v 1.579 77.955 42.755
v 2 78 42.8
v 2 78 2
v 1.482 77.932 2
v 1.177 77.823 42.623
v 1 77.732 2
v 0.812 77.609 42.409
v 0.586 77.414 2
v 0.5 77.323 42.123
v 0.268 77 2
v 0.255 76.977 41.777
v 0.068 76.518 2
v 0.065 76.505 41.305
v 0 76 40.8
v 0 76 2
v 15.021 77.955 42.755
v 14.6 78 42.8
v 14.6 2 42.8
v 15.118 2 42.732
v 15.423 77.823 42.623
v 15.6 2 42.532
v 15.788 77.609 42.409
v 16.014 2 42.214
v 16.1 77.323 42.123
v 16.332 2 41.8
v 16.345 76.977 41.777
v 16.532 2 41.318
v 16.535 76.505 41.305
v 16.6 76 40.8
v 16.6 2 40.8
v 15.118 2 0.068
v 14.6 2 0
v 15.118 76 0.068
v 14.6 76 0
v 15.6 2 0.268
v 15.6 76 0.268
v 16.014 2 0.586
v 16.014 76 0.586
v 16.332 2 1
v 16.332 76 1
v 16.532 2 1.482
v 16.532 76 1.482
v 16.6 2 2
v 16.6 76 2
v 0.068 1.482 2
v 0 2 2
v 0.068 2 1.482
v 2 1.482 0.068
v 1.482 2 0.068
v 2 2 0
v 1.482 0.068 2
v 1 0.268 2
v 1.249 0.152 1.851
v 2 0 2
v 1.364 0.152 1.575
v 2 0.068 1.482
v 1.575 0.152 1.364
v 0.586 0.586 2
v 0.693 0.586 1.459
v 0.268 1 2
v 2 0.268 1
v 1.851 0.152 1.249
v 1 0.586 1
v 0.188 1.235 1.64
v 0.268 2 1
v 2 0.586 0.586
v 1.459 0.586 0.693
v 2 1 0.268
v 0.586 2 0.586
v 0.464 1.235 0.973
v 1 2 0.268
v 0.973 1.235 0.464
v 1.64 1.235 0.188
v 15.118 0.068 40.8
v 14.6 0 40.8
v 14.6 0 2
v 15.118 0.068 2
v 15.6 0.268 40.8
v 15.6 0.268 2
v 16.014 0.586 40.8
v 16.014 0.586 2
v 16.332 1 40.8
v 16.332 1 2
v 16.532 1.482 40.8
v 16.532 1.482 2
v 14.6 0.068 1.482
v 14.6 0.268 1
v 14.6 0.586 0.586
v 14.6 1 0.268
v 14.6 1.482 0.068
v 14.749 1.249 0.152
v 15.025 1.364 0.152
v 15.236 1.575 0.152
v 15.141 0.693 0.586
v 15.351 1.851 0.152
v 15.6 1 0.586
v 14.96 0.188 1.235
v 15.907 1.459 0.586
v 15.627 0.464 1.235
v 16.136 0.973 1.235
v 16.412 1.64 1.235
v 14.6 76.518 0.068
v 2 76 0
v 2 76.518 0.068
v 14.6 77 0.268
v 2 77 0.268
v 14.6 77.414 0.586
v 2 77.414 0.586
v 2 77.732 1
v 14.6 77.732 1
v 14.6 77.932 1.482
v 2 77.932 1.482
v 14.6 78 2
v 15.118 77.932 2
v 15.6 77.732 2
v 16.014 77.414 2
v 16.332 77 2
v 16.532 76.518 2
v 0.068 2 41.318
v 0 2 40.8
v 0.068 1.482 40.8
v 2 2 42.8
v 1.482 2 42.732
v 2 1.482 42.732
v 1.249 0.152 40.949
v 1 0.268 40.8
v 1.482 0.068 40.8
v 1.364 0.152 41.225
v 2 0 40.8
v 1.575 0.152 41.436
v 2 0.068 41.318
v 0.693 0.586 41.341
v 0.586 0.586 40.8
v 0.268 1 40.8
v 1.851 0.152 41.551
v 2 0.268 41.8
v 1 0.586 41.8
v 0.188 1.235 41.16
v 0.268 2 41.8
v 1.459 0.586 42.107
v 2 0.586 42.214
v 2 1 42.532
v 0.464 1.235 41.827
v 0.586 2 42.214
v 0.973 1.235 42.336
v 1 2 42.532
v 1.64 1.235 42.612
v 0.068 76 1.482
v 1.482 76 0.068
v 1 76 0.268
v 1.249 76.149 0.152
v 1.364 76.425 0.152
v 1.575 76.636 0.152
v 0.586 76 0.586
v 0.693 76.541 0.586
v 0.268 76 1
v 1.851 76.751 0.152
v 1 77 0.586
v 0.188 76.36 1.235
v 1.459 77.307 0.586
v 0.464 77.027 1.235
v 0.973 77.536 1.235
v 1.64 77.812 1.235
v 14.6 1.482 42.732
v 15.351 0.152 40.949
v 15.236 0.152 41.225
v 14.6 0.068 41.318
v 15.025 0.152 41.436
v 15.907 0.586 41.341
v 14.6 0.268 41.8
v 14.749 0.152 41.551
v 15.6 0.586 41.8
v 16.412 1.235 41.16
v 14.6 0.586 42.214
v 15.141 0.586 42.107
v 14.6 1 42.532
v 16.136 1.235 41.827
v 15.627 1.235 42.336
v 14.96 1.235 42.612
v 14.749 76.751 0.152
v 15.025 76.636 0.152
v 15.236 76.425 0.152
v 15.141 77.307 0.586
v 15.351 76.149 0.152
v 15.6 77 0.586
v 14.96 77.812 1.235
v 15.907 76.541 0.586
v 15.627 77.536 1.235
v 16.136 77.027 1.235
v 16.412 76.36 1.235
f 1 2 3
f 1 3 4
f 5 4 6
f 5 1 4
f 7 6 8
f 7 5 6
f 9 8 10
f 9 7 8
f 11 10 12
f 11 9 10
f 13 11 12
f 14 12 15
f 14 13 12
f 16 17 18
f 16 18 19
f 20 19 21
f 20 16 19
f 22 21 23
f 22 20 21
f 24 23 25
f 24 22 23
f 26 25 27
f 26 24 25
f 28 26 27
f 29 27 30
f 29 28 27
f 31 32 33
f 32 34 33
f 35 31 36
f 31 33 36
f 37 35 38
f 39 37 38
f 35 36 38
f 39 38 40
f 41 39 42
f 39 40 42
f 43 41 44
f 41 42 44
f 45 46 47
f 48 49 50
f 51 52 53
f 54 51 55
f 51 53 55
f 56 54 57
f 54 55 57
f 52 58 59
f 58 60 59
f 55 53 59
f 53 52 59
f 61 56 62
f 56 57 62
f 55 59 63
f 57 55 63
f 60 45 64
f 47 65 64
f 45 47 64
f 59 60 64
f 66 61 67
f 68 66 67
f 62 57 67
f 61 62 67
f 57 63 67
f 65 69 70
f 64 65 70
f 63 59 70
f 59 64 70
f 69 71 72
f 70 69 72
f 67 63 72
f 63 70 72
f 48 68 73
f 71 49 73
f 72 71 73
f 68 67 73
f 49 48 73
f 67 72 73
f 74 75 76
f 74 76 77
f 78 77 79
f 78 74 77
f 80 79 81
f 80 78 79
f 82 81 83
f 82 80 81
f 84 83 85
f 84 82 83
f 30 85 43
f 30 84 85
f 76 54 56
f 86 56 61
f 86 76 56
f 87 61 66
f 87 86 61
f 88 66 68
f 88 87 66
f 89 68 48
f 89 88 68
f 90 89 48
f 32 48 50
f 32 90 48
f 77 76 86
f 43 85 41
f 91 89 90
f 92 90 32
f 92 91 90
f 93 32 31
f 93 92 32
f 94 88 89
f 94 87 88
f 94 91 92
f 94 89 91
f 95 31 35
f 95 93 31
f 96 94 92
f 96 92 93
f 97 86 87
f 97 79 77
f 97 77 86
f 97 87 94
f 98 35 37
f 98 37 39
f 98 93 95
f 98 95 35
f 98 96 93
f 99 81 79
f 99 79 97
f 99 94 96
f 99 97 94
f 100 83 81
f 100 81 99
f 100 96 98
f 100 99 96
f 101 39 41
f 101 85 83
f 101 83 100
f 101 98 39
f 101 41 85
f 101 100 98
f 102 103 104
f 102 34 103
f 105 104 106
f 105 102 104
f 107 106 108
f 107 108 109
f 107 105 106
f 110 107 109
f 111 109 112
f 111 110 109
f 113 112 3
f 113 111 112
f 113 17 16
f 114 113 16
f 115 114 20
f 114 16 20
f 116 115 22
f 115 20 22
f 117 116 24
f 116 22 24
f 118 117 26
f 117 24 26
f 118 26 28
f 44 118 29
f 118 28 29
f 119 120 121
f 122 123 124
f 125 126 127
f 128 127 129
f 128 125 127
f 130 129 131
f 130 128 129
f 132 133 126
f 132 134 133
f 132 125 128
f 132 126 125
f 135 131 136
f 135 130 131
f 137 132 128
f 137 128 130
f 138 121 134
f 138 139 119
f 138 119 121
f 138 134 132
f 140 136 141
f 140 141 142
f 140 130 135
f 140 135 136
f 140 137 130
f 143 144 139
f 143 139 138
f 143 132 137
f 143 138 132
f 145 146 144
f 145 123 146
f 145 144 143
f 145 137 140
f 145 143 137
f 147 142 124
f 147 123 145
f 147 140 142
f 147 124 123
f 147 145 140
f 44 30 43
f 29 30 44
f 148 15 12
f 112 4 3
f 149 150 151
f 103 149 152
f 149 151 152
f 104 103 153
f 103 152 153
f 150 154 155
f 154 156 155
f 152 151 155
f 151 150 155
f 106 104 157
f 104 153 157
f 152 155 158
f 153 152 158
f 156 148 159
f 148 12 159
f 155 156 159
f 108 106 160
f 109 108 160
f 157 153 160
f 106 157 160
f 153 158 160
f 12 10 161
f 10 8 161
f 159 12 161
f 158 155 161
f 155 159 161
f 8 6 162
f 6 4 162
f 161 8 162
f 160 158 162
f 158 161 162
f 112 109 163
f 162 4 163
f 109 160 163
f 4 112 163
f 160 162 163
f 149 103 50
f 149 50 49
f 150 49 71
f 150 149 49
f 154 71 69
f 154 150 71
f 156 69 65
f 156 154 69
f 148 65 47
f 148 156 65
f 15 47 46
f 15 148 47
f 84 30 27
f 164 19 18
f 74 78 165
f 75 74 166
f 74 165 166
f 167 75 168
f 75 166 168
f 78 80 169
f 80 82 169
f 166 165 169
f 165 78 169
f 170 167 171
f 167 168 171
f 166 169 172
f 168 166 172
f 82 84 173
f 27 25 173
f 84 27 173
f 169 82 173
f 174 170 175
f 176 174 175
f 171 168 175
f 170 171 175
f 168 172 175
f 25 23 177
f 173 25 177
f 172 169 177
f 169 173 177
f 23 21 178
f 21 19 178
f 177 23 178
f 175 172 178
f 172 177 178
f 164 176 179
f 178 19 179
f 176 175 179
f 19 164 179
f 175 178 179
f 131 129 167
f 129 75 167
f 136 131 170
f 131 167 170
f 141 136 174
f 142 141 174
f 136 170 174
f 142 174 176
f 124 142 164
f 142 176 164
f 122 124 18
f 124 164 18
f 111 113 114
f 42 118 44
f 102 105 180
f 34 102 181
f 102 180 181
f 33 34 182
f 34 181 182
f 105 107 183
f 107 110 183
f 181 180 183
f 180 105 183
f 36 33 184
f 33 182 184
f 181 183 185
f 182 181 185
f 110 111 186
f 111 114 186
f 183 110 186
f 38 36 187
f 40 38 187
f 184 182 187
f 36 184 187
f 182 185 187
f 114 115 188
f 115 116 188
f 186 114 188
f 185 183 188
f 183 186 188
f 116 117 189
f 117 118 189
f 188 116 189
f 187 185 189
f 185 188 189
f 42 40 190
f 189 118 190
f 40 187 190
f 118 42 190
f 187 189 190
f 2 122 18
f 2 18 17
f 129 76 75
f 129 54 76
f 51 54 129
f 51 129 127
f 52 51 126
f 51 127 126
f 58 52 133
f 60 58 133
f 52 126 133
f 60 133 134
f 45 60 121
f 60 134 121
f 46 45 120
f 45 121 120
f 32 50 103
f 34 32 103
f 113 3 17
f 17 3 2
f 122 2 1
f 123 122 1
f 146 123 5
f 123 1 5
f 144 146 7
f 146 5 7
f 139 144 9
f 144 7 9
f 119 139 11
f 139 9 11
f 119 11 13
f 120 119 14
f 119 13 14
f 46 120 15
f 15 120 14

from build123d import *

# Parameters (mm, degrees)
SKETCH1_W           = 78
SKETCH1_H           = 42.8
BOSS_EXTRUDE1_DEPTH = 16.6
FILLET1_R           = 2


with BuildPart() as part:
    # Sketch1 → Boss-Extrude1 (new body)
    with BuildSketch(Plane.YZ):
        with Locations((39, 21.4)):
            Rectangle(SKETCH1_W, SKETCH1_H)
    extrude(amount=BOSS_EXTRUDE1_DEPTH)

    # Fillet1
    fillet1_edges = [part.edges().sort_by_distance(p)[0] for p in [
        (16.6, 78, 21.4),
        (16.6, 39, 42.8),
        (16.6, 0, 21.4),
        (0, 39, 42.8),
        (0, 78, 21.4),
        (0, 39, 0),
        (0, 0, 21.4),
        (8.3, 0, 42.8),
        (8.3, 78, 0),
        (8.3, 0, 0),
        (16.6, 39, 0),
    ]]
    fillet(fillet1_edges, radius=FILLET1_R)


solid = part.part
